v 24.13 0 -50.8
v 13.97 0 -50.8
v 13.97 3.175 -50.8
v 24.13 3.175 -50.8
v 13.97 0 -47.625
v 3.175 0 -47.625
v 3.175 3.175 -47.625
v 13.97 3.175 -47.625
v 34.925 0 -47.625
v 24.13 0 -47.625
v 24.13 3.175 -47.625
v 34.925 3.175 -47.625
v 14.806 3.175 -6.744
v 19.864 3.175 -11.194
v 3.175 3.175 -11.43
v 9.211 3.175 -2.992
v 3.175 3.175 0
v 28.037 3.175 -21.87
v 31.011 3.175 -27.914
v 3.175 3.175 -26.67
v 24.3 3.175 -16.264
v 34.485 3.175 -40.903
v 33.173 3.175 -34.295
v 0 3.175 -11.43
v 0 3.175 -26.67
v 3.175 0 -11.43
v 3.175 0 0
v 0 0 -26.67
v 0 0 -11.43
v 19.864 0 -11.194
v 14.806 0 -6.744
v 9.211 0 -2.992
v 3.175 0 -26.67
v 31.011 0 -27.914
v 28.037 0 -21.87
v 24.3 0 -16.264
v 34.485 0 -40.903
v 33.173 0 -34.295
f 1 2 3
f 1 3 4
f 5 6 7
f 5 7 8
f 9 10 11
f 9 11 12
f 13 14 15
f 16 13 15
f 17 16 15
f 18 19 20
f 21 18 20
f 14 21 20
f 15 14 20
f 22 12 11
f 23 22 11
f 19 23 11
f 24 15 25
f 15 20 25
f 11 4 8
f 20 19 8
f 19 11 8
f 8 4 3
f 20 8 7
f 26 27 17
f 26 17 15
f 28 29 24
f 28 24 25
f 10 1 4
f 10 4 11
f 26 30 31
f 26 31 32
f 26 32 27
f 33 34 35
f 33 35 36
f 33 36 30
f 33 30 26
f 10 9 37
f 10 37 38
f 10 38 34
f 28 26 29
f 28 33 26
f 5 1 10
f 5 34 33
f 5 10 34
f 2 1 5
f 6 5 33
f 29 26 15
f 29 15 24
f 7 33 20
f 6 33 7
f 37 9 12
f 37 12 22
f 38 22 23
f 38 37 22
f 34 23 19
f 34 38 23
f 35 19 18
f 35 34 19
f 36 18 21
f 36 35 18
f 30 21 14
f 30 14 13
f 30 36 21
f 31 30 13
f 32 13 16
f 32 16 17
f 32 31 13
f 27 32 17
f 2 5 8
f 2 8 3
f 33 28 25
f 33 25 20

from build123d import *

# Parameters (mm, degrees)
BOSS_EXTRUDE1_DEPTH = 3.175


with BuildPart() as part:
    # Sketch1 → Boss-Extrude1 (new body)
    with BuildSketch(Plane(origin=(0, 0, 0), x_dir=(1, 0, 0), z_dir=(0, 1, 0))):
        with BuildLine():
            Line((0, 26.67), (3.175, 26.67))
            Line((3.175, 26.67), (3.175, 47.625))
            Line((3.175, 47.625), (13.97, 47.625))
            Line((13.97, 47.625), (13.97, 50.8))
            Line((13.97, 50.8), (24.13, 50.8))
            Line((24.13, 50.8), (24.13, 47.625))
            Line((24.13, 47.625), (34.925, 47.625))
            ThreePointArc((34.925, 47.625), (26.259844873, 19.005936751), (3.175, 0))
            Line((3.175, 0), (3.175, 11.43))
            Line((3.175, 11.43), (0, 11.43))
            Line((0, 11.43), (0, 26.67))
        make_face()
    extrude(amount=BOSS_EXTRUDE1_DEPTH)


solid = part.part
